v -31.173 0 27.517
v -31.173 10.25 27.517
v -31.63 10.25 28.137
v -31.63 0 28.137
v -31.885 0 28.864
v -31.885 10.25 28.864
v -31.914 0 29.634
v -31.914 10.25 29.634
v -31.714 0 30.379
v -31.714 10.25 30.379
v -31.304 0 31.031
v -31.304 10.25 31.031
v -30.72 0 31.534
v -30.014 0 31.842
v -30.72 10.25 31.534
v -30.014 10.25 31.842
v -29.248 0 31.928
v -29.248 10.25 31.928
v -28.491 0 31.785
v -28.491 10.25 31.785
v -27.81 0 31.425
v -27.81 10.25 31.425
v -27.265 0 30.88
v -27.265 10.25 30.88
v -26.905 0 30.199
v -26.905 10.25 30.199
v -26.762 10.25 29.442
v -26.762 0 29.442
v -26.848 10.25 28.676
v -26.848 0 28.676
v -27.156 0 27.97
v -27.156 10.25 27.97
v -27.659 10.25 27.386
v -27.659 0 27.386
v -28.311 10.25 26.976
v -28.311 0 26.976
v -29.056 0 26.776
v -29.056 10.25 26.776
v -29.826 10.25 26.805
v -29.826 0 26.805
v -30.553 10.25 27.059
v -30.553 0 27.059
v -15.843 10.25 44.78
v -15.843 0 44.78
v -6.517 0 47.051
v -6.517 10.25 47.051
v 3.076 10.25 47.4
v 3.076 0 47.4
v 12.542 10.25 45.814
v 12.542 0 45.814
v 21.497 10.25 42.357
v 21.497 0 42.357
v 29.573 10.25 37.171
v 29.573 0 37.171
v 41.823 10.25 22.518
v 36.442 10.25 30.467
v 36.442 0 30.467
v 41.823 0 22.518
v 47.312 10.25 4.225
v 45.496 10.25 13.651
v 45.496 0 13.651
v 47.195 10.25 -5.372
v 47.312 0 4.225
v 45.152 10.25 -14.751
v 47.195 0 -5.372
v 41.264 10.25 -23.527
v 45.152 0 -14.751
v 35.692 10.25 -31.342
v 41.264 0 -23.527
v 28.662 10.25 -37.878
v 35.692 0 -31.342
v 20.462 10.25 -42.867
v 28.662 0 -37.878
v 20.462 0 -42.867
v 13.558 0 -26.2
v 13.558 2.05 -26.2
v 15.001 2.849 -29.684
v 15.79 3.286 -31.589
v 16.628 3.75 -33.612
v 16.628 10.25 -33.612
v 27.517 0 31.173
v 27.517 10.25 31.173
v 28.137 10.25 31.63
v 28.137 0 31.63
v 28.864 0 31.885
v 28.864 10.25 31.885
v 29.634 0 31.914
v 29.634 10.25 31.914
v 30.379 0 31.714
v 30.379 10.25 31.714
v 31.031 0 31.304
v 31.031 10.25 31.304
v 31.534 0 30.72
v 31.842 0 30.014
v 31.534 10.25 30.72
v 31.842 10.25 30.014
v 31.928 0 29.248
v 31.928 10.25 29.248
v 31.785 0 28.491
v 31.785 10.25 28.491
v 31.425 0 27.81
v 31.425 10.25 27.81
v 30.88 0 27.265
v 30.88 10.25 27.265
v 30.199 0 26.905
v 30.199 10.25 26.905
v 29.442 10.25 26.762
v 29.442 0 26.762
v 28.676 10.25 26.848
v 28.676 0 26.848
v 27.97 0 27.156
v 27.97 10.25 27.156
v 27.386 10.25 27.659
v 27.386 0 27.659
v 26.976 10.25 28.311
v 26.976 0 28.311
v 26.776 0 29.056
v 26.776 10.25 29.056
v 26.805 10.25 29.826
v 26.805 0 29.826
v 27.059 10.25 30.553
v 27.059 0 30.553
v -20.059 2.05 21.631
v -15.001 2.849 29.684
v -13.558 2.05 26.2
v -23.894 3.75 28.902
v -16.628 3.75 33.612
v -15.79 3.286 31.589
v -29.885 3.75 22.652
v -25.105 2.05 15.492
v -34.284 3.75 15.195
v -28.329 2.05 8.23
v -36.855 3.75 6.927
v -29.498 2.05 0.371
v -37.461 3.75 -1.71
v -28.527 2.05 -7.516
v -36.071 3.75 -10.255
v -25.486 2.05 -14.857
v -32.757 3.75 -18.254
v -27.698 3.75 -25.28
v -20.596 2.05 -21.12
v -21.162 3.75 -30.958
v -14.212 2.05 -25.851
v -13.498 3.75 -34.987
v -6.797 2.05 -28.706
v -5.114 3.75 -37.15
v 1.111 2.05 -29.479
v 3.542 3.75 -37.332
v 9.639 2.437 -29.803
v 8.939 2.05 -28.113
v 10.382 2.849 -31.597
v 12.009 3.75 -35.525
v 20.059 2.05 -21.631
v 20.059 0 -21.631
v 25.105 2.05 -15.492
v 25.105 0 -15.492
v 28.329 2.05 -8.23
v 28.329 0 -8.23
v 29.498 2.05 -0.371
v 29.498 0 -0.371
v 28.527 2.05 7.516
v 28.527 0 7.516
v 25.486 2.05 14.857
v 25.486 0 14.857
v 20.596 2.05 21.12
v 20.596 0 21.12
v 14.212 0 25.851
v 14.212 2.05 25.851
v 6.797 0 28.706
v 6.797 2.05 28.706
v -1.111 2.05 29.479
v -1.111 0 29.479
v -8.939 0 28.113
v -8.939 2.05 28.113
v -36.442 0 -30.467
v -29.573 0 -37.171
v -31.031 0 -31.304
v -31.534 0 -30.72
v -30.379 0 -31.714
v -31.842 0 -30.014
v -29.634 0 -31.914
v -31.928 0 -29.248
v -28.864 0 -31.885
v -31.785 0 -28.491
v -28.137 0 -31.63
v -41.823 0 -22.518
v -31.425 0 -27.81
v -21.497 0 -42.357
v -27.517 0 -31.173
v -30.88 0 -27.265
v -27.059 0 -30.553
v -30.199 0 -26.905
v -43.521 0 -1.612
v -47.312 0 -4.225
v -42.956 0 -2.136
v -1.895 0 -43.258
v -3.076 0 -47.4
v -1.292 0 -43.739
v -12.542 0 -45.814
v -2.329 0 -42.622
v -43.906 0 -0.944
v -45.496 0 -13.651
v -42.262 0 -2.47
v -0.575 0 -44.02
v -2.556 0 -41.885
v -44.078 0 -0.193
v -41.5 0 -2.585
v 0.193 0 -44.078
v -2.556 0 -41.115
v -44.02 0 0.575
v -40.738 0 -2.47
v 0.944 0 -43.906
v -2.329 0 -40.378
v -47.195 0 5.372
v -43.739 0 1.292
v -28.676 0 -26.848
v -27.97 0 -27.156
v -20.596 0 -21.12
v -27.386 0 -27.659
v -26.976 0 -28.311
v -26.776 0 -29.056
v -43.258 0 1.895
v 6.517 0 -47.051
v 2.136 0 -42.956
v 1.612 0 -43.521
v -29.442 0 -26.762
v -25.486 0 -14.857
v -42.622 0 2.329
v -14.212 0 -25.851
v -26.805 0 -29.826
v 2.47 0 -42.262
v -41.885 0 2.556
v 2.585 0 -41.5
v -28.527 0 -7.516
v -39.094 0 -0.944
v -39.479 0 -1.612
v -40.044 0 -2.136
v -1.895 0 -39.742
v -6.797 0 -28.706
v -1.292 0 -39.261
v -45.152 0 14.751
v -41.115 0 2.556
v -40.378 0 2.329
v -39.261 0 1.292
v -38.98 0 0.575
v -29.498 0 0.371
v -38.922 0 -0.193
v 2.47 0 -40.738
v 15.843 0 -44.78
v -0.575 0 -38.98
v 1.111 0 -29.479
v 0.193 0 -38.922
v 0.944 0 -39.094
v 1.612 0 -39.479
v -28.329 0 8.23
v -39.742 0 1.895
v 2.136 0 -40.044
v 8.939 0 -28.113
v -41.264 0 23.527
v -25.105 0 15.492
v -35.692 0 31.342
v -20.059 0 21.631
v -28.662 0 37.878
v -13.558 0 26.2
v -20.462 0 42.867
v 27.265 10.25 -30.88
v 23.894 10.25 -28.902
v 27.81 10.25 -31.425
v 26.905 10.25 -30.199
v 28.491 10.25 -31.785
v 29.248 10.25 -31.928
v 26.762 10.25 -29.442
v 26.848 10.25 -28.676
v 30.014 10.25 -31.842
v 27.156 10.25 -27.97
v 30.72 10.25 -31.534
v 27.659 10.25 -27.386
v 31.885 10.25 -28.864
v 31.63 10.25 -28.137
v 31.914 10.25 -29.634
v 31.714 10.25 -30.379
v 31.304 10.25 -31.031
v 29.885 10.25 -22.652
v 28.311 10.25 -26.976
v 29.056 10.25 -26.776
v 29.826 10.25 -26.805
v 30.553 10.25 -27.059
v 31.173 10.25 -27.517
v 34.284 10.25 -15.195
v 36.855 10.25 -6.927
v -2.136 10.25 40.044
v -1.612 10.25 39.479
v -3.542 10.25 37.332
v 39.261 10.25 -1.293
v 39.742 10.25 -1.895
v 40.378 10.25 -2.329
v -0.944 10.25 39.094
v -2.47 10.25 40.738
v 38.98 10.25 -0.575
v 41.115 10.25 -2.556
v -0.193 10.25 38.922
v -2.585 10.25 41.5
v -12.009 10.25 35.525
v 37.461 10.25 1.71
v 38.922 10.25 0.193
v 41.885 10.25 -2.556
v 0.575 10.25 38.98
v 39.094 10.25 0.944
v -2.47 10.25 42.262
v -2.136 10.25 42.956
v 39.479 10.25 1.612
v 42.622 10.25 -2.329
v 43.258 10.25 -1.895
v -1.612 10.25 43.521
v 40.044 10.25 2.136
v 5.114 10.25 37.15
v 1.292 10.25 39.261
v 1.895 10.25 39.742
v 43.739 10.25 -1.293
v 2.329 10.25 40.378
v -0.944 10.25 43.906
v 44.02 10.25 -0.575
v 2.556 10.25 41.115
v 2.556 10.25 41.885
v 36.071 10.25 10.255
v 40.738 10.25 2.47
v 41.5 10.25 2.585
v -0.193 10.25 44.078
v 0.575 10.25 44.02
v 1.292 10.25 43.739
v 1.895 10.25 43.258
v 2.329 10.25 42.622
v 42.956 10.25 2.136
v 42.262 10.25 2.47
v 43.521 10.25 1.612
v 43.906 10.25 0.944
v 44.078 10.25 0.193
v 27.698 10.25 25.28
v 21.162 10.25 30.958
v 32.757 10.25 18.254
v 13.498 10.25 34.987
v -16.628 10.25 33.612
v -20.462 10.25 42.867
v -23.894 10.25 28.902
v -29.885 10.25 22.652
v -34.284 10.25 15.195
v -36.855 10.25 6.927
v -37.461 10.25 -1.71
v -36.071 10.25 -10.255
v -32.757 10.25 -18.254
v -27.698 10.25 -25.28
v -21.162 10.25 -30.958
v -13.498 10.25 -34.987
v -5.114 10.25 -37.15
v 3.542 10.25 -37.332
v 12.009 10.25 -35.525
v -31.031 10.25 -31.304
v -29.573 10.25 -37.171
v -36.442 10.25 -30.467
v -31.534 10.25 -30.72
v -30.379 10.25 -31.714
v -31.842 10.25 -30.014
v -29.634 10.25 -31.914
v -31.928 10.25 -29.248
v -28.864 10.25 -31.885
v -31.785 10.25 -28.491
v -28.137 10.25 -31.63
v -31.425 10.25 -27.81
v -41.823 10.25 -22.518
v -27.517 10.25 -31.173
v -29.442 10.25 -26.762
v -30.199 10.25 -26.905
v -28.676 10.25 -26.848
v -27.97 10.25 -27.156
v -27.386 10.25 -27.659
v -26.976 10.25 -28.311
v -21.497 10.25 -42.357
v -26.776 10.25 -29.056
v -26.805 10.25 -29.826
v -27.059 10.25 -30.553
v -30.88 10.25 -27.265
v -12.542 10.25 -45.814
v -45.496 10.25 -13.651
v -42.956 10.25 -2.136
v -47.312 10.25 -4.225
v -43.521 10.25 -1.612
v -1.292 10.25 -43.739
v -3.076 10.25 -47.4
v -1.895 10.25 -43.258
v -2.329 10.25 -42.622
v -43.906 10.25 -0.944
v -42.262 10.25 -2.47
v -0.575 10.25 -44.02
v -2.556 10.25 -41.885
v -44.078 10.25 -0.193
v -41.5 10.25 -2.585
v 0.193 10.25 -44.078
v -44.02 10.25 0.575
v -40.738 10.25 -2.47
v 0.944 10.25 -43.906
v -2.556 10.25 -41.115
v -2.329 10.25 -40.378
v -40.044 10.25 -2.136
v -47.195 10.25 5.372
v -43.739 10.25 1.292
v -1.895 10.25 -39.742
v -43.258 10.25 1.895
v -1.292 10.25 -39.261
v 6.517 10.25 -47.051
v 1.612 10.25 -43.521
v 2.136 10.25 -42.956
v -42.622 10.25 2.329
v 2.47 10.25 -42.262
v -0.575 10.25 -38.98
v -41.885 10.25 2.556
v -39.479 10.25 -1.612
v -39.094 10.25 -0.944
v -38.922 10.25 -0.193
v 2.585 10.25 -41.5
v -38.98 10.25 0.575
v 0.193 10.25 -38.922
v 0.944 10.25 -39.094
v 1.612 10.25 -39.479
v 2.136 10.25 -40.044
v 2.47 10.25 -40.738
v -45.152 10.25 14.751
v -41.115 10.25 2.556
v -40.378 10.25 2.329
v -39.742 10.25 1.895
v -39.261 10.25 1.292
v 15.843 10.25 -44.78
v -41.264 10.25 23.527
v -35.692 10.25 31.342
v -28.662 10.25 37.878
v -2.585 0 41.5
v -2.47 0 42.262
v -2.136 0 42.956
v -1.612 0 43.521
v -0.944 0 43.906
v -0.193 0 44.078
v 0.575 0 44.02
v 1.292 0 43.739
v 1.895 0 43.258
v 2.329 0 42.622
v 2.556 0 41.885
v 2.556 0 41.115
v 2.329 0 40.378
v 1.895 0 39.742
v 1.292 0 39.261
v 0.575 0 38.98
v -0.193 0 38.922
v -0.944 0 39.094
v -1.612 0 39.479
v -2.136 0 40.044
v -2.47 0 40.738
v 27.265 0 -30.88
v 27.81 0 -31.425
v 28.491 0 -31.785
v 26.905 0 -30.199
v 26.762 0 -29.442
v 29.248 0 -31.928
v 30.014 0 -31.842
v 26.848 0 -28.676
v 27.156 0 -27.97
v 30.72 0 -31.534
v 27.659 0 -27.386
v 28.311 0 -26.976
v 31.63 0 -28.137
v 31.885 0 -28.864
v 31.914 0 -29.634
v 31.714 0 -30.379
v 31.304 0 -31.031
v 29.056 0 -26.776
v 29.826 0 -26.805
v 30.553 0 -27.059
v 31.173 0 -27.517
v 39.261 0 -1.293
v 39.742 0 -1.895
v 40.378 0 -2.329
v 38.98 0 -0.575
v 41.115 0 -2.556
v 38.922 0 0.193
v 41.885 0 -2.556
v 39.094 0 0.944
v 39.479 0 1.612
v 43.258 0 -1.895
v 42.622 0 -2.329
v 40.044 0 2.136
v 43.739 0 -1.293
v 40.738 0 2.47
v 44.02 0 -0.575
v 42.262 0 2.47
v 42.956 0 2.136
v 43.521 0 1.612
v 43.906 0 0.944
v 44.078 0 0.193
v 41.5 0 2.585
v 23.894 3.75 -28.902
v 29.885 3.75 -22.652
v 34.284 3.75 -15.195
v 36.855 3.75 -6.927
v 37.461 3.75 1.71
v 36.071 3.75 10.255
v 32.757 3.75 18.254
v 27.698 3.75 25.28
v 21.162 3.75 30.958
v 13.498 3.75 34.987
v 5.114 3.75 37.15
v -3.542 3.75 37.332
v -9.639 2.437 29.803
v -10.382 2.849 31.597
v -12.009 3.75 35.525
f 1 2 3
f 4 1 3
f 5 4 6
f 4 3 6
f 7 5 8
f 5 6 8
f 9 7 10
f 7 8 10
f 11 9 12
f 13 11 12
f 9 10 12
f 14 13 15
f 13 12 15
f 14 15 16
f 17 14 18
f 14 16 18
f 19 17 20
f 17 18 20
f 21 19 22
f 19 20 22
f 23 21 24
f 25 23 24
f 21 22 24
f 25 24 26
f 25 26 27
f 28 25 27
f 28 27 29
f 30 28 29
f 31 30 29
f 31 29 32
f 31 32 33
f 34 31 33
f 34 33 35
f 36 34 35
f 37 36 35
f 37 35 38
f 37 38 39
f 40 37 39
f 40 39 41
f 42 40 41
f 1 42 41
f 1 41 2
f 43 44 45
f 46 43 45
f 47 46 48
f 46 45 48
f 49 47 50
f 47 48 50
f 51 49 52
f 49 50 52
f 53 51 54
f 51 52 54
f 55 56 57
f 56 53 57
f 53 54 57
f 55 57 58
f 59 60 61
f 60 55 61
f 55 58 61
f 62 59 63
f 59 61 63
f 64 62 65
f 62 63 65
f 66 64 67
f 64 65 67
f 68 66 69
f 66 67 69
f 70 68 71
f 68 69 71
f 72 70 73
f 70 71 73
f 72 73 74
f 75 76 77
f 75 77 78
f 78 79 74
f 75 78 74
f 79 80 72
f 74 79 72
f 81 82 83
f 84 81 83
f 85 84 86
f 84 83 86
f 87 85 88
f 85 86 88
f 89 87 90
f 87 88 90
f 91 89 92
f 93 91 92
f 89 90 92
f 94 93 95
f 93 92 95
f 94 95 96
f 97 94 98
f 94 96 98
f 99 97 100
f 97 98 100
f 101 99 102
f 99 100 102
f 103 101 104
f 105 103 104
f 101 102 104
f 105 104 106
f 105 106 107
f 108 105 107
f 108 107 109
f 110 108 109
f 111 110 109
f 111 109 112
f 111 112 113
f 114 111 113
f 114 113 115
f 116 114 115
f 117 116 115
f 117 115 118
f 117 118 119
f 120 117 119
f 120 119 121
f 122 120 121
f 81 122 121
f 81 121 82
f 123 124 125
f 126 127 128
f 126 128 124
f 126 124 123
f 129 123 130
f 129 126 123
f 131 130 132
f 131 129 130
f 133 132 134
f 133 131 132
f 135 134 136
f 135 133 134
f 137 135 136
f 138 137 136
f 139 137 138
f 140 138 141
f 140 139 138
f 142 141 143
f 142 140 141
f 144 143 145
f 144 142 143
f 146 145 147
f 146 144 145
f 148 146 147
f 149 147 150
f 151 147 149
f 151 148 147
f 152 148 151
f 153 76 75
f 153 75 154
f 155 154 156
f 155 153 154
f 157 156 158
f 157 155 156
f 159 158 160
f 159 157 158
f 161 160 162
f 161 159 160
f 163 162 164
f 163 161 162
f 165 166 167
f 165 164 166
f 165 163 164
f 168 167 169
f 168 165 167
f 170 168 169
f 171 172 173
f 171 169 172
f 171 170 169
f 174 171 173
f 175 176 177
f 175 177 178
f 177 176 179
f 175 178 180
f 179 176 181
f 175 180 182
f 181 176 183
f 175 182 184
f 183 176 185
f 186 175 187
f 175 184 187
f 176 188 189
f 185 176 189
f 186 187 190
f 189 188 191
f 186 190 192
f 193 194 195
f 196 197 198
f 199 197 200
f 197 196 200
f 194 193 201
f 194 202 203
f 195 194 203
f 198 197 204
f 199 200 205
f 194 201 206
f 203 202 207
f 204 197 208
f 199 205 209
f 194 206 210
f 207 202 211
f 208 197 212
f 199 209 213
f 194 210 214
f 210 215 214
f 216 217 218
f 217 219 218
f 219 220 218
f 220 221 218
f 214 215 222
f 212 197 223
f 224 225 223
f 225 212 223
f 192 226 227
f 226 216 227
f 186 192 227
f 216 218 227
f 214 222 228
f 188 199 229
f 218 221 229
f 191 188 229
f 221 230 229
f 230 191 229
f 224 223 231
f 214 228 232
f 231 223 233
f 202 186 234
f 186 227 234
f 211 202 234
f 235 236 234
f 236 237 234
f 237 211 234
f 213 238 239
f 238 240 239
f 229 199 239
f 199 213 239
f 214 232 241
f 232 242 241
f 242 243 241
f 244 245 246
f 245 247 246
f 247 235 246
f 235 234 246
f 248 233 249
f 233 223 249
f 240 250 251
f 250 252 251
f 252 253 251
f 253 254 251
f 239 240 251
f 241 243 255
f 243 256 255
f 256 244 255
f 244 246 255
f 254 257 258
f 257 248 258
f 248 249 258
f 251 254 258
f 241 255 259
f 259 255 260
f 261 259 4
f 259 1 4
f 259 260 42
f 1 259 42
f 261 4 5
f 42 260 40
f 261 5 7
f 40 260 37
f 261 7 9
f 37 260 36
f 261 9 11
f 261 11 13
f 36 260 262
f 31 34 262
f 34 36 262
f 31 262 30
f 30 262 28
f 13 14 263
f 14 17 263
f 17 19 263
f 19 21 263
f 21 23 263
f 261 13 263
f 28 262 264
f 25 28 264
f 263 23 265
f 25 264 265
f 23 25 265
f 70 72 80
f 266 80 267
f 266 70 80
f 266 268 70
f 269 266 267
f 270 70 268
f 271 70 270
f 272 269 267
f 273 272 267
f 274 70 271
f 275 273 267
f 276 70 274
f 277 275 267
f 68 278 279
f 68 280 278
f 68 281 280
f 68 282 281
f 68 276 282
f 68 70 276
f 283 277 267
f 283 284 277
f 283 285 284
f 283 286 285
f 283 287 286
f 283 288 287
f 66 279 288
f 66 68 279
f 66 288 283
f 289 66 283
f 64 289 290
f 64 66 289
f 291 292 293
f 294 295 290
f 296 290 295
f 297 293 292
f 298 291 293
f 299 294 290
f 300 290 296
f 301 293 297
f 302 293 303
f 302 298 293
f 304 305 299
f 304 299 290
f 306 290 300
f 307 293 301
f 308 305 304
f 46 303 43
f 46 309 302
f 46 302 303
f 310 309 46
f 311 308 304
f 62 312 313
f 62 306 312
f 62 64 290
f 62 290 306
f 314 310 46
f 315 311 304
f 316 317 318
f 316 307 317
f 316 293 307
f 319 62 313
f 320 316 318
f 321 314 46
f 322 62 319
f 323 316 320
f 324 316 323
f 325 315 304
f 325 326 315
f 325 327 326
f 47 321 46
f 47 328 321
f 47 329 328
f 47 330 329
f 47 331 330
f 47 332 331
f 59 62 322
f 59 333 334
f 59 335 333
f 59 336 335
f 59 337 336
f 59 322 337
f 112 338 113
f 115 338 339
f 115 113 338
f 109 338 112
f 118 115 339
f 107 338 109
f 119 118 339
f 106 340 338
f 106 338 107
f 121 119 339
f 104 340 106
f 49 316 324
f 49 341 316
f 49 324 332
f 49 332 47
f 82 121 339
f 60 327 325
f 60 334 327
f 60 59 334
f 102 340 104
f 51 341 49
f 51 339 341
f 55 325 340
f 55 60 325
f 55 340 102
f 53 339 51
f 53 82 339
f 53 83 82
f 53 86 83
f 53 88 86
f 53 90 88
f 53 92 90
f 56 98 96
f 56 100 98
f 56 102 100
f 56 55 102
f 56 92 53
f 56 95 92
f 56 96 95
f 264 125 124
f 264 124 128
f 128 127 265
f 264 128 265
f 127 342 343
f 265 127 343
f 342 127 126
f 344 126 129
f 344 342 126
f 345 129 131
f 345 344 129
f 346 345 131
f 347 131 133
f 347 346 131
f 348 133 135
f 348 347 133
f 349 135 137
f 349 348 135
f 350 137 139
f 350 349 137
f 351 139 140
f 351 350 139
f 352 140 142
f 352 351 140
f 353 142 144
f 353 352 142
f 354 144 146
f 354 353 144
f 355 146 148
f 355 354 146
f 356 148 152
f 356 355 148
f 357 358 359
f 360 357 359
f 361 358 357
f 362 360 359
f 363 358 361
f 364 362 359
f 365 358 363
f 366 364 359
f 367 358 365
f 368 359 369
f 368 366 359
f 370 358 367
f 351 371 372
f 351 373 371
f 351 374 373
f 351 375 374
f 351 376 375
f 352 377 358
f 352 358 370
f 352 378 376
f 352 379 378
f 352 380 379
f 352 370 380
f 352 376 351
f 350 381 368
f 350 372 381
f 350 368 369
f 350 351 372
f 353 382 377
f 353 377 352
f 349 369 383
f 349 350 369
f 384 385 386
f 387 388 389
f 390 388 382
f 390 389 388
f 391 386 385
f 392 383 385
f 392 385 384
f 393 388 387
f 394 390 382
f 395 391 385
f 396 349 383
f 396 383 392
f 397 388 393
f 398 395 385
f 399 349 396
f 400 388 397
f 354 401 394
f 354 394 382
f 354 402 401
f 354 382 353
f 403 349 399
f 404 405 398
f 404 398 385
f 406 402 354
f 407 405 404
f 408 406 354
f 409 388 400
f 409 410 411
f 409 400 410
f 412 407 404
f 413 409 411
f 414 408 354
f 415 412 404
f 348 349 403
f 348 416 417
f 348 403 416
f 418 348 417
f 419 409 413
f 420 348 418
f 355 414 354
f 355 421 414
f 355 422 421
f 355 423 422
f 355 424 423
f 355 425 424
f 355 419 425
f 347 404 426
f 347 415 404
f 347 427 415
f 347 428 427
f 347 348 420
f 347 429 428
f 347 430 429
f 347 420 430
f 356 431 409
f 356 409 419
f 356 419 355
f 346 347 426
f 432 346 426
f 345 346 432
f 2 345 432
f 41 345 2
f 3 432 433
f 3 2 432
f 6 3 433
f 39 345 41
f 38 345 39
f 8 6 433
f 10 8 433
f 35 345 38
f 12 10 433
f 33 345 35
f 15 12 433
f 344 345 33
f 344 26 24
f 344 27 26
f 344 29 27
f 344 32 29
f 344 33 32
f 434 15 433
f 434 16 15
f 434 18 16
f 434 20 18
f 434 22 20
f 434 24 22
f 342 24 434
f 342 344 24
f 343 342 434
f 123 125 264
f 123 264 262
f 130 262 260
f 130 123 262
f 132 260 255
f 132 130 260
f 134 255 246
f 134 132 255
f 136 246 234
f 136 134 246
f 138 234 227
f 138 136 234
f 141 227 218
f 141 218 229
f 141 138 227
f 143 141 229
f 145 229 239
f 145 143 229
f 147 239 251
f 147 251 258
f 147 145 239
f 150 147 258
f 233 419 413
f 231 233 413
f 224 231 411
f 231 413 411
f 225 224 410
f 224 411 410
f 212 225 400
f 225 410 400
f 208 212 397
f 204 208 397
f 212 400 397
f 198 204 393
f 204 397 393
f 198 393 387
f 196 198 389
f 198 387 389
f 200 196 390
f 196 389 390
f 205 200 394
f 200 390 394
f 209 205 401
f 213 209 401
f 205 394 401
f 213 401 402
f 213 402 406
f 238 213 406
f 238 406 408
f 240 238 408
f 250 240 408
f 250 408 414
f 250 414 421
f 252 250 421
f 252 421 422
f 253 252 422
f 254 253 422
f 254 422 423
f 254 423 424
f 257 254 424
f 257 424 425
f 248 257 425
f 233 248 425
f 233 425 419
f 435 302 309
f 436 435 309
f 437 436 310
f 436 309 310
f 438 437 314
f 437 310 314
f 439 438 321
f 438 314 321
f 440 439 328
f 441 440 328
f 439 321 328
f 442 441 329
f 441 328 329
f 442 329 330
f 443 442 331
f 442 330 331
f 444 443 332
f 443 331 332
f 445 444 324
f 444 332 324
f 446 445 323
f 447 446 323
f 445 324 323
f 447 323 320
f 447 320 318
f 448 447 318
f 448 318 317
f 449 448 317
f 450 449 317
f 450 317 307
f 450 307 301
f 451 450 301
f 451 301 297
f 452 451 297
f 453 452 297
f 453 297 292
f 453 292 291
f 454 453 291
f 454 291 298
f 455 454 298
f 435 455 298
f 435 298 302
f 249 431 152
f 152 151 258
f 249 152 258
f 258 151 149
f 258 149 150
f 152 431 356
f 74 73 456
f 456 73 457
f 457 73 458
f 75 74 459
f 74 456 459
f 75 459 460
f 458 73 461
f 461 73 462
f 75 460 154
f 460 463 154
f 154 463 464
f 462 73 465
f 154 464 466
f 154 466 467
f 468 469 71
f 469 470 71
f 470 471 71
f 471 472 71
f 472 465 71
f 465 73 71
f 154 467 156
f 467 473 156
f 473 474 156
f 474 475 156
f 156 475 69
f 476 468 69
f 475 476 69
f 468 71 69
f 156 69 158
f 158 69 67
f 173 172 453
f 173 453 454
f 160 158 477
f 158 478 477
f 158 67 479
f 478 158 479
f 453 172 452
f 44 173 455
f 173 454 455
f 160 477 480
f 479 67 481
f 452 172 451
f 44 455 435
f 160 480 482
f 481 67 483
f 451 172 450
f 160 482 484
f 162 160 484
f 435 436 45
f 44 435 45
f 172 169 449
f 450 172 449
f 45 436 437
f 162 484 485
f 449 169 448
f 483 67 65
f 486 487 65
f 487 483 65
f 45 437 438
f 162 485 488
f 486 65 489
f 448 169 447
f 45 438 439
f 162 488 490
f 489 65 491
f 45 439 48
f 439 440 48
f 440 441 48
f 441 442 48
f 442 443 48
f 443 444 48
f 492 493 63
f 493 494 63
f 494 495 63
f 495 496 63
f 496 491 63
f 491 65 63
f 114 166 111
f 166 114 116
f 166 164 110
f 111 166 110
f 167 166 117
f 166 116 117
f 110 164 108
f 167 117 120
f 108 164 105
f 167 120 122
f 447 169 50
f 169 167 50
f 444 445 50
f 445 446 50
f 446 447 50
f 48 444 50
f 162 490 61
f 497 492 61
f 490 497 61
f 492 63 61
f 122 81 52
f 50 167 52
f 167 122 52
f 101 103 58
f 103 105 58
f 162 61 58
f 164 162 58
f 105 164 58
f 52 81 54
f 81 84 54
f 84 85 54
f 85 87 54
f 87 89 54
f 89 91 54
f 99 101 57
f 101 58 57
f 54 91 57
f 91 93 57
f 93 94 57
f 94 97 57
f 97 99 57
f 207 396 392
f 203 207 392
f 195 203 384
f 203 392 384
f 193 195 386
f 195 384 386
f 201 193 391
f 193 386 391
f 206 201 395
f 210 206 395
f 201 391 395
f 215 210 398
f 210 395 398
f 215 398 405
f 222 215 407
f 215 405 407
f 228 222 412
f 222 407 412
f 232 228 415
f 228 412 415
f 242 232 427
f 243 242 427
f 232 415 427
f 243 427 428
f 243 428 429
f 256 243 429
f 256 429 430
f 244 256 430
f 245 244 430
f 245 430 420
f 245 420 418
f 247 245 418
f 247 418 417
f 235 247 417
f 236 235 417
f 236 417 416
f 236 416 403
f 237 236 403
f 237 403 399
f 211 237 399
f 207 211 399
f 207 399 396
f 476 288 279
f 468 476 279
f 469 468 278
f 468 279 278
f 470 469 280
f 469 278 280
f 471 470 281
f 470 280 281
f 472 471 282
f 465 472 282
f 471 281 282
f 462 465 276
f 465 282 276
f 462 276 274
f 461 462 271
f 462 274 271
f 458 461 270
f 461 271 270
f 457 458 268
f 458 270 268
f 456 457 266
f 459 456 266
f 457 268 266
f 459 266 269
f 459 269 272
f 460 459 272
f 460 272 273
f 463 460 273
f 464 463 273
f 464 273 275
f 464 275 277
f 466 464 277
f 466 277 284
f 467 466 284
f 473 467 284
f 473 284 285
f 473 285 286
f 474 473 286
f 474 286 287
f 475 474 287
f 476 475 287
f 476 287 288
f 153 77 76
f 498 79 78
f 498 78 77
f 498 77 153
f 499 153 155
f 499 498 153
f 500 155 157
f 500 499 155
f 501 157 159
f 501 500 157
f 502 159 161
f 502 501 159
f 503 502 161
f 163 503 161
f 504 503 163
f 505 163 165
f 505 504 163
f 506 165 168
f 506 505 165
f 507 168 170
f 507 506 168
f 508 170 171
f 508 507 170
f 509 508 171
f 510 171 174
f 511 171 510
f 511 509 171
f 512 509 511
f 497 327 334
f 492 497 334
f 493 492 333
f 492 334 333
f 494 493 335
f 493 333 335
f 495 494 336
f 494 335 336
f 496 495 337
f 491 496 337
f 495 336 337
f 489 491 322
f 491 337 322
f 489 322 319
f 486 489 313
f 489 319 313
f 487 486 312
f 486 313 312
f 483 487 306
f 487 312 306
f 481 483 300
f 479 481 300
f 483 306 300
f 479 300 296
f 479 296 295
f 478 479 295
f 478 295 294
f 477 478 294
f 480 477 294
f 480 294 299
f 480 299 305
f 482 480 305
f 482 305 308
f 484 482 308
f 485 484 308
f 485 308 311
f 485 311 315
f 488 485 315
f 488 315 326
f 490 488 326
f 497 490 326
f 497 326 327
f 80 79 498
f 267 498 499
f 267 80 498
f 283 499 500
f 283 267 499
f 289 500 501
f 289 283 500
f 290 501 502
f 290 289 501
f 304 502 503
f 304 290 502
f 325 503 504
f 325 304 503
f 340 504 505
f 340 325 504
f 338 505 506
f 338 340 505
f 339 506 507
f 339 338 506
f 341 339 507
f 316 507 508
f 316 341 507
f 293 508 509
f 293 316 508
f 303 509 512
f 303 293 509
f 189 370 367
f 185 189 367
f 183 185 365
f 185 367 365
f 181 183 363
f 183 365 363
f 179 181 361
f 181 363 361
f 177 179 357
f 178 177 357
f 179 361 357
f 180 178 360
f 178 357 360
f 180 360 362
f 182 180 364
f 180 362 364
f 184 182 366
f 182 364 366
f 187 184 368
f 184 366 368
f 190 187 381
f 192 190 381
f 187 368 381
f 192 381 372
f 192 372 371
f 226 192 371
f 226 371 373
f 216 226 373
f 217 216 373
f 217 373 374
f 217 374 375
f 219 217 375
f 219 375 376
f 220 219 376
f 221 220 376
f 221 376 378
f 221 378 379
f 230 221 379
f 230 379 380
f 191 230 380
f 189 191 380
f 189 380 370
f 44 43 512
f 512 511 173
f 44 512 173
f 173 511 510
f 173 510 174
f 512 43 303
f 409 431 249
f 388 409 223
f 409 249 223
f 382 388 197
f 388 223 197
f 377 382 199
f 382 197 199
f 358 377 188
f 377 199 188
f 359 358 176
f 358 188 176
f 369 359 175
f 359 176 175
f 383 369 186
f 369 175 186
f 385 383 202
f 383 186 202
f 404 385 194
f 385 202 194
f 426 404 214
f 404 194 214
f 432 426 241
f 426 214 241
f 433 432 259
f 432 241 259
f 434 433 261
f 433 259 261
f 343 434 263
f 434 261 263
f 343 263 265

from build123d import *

# Parameters (mm, degrees)
SKETCH1_R           = 47.5
BOSS_EXTRUDE1_DEPTH = 10.25
SKETCH3_R           = 2.585
CUT_EXTRUDE1_DEPTH  = 68.952648955
CIRPATTERN1_COUNT   = 8
CUT_EXTRUDE2_DEPTH  = 68.952648955


with BuildPart() as part:
    # Sketch1 → Boss-Extrude1 (new body)
    with BuildSketch(Plane(origin=(0, 0, 0), x_dir=(1, 0, 0), z_dir=(0, 1, 0))):
        with Locations(Location((0, 0, 0), (0, 0, 270))):
            Circle(SKETCH1_R)
    extrude(amount=BOSS_EXTRUDE1_DEPTH)

    # Sketch2 → Cut-Revolve1 (revolve, cut)
    with BuildSketch(Plane.XY, mode=Mode.PRIVATE) as cut_revolve1_sk:
        Polygon((29.5, 0), (29.5, 2.049547507), (37.5, 3.75), (37.5, 10.25), (0, 10.25), (0, 0), align=None)
    revolve(cut_revolve1_sk.sketch.rotate(Axis((0, 0, 0), (0, -1, 0)), 90), axis=Axis((0, 0, 0), (0, -1, 0)), mode=Mode.SUBTRACT)

    # Sketch3 → Cut-Extrude1 (cut, through all)
    with BuildSketch(Plane(origin=(0, 10.25, 0), x_dir=(1, 0, 0), z_dir=(0, 1, 0))):
        with Locations(Location((41.5, 0, 0), (0, 0, 270))):
            Circle(SKETCH3_R)
    cut_extrude1 = extrude(amount=-CUT_EXTRUDE1_DEPTH, mode=Mode.SUBTRACT)

    # CirPattern1: Cut-Extrude1 ×8 about axis
    cirpattern1_axis = Axis((0, 0, 0), (0, 1, 0))
    for i in range(1, CIRPATTERN1_COUNT):
        add(cut_extrude1.rotate(cirpattern1_axis, i * 360 / CIRPATTERN1_COUNT), mode=Mode.SUBTRACT)

    # Sketch4 → Cut-Extrude2 (cut, through all)
    with BuildSketch(Plane(origin=(0, 10.25, 0), x_dir=(1, 0, 0), z_dir=(0, 1, 0))):
        with BuildLine():
            Line((15.842570205, 44.780162676), (-20.461967868, -42.866745514))
            ThreePointArc((-20.461967868, -42.866745514), (-18.177463037, -43.884277794), (-15.842570205, -44.780162676))
            Line((-15.842570205, -44.780162676), (20.461967868, 42.866745514))
            ThreePointArc((20.461967868, 42.866745514), (18.177463037, 43.884277794), (15.842570205, 44.780162676))
        make_face()
    extrude(amount=-CUT_EXTRUDE2_DEPTH, mode=Mode.SUBTRACT)


with BuildPart() as cut_extrude2_piece_1:
    # of the separate pieces the step leaves, piece 1, a body of its own (cut_extrude2_pieces)
    add(part.part.solids().sort_by_distance((-15.842570205, 0, 44.780162676))[0])


with BuildPart() as cut_extrude2_piece_2:
    # of the separate pieces the step leaves, piece 2, a body of its own (cut_extrude2_pieces)
    add(part.part.solids().sort_by_distance((15.842570205, 0, -44.780162676))[0])


solid = Compound([cut_extrude2_piece_1.part, cut_extrude2_piece_2.part])
